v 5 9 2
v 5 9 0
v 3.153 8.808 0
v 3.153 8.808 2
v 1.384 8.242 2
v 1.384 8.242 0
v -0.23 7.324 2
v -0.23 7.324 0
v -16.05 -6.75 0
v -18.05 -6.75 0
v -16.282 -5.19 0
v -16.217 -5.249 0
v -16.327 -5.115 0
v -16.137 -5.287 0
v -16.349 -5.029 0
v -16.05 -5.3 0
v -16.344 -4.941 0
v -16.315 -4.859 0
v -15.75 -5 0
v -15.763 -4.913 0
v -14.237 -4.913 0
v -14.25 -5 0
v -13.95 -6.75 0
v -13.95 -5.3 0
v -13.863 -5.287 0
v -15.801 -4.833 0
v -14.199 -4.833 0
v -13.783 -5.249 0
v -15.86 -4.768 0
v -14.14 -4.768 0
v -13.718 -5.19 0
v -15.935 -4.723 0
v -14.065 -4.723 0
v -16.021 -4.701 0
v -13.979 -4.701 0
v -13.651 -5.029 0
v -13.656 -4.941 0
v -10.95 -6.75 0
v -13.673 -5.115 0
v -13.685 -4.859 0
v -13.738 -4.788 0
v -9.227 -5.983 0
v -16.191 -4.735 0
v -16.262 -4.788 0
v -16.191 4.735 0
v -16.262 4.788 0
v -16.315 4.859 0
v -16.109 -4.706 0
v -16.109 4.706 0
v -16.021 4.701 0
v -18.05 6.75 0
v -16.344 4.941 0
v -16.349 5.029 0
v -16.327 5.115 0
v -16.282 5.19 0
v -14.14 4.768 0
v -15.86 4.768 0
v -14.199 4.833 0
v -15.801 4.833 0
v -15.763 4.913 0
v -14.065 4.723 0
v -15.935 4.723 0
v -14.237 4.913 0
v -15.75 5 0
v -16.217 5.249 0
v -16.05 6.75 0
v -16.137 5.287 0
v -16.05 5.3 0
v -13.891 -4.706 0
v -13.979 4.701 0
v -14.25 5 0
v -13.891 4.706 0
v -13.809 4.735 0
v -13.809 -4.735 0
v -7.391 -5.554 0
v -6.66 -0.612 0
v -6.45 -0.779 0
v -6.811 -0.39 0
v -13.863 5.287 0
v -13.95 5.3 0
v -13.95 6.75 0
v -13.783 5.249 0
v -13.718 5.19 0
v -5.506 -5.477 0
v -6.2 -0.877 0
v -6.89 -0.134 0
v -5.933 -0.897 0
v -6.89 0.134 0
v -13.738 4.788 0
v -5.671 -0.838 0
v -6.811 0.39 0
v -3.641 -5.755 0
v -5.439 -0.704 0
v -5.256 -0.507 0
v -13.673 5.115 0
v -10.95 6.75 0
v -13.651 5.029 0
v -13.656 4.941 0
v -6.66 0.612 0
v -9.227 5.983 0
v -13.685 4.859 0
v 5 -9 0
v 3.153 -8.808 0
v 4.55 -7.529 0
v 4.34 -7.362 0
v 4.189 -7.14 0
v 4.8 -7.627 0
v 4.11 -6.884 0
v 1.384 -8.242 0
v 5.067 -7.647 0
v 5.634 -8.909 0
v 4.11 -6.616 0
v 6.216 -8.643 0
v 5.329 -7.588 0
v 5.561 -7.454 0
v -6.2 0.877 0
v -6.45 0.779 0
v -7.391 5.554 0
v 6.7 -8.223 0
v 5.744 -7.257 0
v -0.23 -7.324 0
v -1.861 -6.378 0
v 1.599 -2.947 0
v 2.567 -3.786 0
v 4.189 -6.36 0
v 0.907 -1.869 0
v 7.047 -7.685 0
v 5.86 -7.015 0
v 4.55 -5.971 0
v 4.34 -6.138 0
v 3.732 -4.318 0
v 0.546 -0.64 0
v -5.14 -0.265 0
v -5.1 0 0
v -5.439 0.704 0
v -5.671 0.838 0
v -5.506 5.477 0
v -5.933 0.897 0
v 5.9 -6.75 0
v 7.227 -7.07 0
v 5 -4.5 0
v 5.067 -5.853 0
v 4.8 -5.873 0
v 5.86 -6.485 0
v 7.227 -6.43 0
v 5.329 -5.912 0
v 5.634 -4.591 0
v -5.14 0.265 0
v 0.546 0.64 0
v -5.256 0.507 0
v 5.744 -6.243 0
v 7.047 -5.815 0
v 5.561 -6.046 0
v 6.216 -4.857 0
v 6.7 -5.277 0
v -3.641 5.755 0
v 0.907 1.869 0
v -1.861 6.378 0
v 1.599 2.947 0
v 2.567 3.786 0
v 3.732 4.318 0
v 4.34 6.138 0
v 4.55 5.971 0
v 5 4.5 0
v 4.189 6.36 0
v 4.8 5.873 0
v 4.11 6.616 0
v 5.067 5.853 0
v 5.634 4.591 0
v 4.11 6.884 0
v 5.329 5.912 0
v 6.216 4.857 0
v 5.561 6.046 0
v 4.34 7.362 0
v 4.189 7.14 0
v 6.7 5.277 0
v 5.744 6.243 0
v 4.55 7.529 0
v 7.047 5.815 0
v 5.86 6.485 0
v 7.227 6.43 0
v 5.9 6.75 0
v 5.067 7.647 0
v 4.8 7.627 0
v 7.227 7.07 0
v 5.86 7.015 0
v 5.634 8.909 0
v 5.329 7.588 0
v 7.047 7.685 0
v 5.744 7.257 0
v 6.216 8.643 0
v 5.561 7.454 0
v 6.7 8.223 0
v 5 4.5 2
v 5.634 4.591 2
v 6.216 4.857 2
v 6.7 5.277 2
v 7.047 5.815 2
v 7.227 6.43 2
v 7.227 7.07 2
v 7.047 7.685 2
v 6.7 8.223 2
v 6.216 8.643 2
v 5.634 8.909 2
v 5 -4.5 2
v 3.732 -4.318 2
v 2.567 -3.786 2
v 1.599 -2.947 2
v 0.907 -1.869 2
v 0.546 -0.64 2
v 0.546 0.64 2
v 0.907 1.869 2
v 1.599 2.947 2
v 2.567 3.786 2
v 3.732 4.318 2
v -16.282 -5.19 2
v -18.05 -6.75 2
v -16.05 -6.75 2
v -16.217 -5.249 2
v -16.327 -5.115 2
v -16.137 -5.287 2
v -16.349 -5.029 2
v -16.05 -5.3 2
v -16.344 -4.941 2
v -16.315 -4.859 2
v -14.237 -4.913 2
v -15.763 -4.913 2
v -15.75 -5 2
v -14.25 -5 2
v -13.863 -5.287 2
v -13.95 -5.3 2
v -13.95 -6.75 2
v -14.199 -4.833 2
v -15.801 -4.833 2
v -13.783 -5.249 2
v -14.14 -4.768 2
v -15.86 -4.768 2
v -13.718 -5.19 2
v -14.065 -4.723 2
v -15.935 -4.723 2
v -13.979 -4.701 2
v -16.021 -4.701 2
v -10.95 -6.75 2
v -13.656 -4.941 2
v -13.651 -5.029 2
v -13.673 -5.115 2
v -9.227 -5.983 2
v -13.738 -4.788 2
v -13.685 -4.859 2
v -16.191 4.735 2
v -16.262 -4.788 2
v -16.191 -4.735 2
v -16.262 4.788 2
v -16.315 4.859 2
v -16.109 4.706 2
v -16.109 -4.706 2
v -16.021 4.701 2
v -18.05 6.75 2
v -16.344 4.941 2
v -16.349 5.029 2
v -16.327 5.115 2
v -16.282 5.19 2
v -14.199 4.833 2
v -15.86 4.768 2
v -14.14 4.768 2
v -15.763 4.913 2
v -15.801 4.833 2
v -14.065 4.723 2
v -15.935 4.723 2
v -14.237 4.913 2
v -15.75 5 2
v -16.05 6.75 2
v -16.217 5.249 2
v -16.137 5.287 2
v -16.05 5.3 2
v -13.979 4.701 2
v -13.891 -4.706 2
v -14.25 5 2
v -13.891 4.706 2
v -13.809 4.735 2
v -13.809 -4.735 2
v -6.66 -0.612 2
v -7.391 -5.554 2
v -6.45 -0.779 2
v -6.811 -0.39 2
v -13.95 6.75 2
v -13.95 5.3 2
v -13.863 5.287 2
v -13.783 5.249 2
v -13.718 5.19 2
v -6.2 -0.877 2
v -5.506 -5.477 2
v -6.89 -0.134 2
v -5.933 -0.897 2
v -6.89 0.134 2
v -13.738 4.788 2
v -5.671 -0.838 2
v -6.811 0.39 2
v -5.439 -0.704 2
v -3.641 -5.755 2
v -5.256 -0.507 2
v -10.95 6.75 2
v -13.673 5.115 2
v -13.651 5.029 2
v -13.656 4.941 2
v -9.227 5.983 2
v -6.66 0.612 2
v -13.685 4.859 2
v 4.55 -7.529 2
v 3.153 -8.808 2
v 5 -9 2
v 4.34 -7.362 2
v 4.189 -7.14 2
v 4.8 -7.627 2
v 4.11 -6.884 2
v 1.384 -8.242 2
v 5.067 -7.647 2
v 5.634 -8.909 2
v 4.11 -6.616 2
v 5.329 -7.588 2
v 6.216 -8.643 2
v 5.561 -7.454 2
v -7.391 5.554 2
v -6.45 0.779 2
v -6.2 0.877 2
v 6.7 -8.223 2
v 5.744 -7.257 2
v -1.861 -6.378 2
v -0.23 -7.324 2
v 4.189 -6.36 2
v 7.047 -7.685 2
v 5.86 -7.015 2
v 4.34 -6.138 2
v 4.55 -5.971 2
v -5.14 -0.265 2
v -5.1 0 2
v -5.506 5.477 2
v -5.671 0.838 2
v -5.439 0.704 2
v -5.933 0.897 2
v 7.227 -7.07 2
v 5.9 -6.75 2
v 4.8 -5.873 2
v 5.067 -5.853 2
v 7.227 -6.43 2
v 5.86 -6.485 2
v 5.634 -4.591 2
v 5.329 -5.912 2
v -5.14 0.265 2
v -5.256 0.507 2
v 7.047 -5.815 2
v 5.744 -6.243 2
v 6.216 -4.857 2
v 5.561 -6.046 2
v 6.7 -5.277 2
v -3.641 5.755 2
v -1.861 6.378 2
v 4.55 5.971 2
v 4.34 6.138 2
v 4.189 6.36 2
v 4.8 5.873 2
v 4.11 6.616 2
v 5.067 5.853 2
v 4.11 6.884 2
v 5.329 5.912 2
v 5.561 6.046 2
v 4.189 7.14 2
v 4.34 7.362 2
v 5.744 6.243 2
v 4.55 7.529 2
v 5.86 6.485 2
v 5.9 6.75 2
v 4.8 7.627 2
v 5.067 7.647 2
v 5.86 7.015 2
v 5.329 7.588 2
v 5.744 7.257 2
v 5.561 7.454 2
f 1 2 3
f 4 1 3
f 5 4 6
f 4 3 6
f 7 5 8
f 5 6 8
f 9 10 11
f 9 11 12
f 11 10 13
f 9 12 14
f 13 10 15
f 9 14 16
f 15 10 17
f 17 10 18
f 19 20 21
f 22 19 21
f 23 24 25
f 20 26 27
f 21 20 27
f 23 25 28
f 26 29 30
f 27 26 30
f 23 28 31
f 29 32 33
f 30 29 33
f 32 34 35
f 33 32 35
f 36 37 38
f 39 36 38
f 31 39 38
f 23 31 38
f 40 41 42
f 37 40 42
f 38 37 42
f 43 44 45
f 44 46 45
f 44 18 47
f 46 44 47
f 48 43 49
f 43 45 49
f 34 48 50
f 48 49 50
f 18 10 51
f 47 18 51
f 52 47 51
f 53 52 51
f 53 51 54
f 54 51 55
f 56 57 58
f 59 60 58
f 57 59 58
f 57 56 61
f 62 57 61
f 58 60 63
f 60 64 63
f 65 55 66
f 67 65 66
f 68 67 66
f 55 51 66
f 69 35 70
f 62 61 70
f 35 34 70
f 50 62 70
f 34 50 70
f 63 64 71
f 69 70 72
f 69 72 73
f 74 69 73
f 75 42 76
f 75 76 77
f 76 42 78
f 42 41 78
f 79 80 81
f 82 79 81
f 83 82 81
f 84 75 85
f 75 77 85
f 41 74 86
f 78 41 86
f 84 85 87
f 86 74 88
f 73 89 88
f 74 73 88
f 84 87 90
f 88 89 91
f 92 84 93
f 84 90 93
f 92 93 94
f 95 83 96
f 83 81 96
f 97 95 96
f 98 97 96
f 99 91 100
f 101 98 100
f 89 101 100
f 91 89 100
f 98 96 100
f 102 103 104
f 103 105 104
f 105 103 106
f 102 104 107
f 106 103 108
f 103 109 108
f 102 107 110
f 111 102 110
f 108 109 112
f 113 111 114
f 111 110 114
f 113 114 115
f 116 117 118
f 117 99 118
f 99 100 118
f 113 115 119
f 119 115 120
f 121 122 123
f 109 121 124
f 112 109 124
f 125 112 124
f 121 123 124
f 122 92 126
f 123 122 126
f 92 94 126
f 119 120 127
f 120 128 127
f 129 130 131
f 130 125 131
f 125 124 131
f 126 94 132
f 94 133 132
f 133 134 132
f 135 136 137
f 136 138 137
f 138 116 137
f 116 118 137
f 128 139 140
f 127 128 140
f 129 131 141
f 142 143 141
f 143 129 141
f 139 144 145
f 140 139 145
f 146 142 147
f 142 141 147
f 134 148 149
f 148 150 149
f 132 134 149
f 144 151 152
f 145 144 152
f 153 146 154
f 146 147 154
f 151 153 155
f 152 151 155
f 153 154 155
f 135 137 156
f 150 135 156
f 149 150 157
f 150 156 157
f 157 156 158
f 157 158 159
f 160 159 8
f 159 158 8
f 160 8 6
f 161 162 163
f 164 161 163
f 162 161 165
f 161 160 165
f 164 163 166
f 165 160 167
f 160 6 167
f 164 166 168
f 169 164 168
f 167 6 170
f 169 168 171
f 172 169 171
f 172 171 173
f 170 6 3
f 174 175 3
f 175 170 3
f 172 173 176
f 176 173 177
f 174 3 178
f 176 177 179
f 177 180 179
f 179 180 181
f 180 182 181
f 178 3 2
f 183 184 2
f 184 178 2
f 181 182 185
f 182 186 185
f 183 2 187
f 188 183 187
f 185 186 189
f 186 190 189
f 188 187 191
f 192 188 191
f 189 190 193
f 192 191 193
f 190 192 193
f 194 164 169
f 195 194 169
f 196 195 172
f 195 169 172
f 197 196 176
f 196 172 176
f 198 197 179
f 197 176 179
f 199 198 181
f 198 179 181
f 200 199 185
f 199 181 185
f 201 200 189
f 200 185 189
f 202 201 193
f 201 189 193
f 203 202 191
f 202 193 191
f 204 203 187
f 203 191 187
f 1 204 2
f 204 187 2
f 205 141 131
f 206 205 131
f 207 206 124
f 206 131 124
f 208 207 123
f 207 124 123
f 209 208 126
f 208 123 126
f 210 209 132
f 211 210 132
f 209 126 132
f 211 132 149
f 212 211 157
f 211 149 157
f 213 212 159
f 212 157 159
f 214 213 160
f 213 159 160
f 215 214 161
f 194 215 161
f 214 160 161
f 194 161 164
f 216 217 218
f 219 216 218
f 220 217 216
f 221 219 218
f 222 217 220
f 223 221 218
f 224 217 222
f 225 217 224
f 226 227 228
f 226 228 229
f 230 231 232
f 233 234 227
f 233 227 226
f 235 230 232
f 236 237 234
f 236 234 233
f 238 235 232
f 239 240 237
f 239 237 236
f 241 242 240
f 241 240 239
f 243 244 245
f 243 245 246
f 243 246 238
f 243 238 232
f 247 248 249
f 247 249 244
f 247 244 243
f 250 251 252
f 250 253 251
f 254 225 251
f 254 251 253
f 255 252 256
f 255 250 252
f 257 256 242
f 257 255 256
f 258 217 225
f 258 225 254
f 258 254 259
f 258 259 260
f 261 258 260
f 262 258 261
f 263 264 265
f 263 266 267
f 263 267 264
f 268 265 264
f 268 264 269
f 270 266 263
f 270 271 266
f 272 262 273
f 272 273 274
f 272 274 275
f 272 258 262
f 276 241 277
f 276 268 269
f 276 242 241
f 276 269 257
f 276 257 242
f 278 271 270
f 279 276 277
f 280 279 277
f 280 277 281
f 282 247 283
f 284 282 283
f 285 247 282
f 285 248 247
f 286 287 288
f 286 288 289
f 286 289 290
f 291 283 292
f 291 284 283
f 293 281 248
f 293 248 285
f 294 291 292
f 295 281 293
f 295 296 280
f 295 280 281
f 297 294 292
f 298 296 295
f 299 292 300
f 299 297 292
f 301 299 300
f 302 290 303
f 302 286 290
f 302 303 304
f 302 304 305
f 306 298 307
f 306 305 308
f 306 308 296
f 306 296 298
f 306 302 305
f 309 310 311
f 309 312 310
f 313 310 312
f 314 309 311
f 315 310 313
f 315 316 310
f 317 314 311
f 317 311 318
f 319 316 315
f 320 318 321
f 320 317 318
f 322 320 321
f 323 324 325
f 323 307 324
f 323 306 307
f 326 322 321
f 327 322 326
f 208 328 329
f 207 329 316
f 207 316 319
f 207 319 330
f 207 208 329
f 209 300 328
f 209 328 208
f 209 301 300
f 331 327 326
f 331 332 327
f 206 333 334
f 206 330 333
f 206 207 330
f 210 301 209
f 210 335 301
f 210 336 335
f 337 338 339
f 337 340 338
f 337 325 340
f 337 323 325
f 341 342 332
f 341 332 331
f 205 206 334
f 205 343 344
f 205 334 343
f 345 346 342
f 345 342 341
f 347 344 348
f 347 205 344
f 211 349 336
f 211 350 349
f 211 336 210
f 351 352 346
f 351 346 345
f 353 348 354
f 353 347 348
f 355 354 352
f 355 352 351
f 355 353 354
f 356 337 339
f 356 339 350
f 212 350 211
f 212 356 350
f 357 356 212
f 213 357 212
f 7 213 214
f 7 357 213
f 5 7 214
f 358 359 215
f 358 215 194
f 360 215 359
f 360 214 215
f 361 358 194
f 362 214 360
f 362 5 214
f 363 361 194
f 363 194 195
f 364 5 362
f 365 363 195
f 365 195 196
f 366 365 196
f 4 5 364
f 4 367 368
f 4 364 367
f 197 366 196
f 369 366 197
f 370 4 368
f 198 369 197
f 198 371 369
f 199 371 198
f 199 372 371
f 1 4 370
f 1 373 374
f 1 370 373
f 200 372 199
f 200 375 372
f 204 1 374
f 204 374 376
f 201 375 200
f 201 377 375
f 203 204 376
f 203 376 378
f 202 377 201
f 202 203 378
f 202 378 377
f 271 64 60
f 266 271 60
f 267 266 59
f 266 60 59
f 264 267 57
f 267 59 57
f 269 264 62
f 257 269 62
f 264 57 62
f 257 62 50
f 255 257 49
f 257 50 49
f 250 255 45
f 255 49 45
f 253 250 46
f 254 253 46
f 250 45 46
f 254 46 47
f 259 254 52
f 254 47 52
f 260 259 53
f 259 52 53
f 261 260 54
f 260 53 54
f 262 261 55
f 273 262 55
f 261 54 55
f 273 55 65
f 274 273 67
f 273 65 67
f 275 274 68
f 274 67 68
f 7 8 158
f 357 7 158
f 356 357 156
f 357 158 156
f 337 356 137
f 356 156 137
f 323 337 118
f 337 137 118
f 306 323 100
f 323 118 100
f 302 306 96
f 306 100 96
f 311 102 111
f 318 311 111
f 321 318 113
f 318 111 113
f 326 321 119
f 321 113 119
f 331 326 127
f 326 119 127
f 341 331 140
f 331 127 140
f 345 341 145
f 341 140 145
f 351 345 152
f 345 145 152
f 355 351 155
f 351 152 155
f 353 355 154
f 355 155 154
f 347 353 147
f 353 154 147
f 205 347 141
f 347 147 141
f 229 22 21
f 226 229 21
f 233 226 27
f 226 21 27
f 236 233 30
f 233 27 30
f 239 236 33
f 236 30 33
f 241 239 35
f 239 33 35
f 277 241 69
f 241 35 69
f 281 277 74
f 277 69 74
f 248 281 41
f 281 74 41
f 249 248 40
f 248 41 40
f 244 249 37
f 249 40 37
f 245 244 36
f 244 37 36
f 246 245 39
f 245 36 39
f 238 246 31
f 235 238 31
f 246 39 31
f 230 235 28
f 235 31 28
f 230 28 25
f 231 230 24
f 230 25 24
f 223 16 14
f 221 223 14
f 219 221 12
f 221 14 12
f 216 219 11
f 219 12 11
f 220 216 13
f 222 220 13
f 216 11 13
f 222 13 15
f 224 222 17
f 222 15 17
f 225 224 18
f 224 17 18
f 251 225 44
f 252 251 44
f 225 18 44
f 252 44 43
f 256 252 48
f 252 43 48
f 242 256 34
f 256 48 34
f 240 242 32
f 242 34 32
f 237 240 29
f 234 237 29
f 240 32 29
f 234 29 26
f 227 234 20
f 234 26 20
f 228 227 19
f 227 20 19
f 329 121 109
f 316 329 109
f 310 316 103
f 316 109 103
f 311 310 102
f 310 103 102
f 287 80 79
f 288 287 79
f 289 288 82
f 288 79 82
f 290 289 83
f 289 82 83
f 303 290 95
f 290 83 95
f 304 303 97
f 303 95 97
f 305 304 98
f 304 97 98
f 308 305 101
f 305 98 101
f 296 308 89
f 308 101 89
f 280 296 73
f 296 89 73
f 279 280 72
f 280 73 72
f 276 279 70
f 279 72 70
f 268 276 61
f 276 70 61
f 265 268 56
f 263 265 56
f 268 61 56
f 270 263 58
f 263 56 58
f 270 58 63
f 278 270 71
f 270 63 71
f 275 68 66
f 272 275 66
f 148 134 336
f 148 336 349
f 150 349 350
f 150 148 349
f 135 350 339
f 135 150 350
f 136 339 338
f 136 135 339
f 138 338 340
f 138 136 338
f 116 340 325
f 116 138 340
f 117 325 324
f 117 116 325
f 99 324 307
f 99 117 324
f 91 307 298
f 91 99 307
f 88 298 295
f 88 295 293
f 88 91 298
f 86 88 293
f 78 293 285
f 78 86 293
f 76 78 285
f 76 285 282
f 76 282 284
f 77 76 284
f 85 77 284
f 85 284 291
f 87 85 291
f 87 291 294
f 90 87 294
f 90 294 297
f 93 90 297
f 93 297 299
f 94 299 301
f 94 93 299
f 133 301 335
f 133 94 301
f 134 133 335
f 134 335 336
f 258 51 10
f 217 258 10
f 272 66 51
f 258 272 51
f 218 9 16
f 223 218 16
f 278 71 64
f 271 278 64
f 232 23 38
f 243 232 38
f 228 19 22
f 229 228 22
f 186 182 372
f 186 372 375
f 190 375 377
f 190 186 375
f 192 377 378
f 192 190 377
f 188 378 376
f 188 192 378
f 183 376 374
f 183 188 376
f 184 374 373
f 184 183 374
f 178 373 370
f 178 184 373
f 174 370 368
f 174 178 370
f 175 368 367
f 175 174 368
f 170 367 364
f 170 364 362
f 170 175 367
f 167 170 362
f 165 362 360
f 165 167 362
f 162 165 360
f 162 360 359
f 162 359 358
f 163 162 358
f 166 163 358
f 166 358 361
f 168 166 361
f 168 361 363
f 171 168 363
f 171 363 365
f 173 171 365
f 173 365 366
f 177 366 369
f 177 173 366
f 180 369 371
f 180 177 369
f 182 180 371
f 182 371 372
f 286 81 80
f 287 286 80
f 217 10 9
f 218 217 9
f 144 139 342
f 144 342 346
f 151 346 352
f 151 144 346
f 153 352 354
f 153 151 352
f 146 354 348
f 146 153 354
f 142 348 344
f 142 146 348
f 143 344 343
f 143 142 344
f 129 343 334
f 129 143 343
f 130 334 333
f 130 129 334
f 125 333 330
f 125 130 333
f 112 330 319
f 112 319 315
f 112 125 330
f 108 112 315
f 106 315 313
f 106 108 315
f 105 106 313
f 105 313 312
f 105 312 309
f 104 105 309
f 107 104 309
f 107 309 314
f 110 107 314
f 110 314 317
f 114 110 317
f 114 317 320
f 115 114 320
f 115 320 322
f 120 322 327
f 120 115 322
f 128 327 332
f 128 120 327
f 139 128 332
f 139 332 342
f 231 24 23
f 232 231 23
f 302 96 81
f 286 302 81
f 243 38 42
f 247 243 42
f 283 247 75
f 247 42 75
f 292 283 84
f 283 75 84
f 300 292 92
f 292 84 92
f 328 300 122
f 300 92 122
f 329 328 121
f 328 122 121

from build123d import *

# Parameters (mm, degrees)
SKETCH_1_R      = 0.9
EXTRUDE_1_DEPTH = 2


with BuildPart() as part:
    # 草图1 → 凸台-拉伸1 (new body)
    with BuildSketch(Plane.XY):
        with BuildLine():
            Line((-13.95, -5.299998555), (-13.95, -6.75))
            Line((-13.95, -6.75), (-10.95, -6.75))
            ThreePointArc((-10.95, -6.75), (-5.506483958, -5.47673518), (-0.23016259, -7.324301965))
            ThreePointArc((-0.23016259, -7.324301965), (2.253977211, -8.570843532), (5, -9))
            ThreePointArc((5, -9), (7.25, -6.75), (5, -4.5))
            ThreePointArc((5, -4.5), (0.5, 0), (5, 4.5))
            ThreePointArc((5, 4.5), (7.25, 6.75), (5, 9))
            ThreePointArc((5, 9), (2.253977211, 8.570843532), (-0.23016259, 7.324301965))
            ThreePointArc((-0.23016259, 7.324301965), (-5.506483958, 5.47673518), (-10.95, 6.75))
            Line((-10.95, 6.75), (-13.95, 6.75))
            Line((-13.95, 6.75), (-13.95, 5.299998555))
            ThreePointArc((-13.95, 5.299998555), (-13.737867966, 4.787866521), (-14.25, 4.999998555))
            Line((-14.25, 4.999998555), (-15.75, 4.999998555))
            ThreePointArc((-15.75, 4.999998555), (-16.262132034, 4.787866521), (-16.05, 5.299998555))
            Line((-16.05, 5.299998555), (-16.05, 6.75))
            Line((-16.05, 6.75), (-18.05, 6.75))
            Line((-18.05, 6.75), (-18.05, -6.75))
            Line((-18.05, -6.75), (-16.05, -6.75))
            Line((-16.05, -6.75), (-16.05, -5.299998555))
            ThreePointArc((-16.05, -5.299998555), (-16.262132034, -4.787866521), (-15.75, -4.999998555))
            Line((-15.75, -4.999998555), (-14.25, -4.999998555))
            ThreePointArc((-14.25, -4.999998555), (-13.737867966, -4.787866521), (-13.95, -5.299998555))
        make_face()
        with Locations((-6, 0)):
            Circle(SKETCH_1_R, mode=Mode.SUBTRACT)
        with Locations((5, 6.75)):
            Circle(SKETCH_1_R, mode=Mode.SUBTRACT)
        with Locations((5, -6.75)):
            Circle(SKETCH_1_R, mode=Mode.SUBTRACT)
    extrude(amount=EXTRUDE_1_DEPTH)


solid = part.part
